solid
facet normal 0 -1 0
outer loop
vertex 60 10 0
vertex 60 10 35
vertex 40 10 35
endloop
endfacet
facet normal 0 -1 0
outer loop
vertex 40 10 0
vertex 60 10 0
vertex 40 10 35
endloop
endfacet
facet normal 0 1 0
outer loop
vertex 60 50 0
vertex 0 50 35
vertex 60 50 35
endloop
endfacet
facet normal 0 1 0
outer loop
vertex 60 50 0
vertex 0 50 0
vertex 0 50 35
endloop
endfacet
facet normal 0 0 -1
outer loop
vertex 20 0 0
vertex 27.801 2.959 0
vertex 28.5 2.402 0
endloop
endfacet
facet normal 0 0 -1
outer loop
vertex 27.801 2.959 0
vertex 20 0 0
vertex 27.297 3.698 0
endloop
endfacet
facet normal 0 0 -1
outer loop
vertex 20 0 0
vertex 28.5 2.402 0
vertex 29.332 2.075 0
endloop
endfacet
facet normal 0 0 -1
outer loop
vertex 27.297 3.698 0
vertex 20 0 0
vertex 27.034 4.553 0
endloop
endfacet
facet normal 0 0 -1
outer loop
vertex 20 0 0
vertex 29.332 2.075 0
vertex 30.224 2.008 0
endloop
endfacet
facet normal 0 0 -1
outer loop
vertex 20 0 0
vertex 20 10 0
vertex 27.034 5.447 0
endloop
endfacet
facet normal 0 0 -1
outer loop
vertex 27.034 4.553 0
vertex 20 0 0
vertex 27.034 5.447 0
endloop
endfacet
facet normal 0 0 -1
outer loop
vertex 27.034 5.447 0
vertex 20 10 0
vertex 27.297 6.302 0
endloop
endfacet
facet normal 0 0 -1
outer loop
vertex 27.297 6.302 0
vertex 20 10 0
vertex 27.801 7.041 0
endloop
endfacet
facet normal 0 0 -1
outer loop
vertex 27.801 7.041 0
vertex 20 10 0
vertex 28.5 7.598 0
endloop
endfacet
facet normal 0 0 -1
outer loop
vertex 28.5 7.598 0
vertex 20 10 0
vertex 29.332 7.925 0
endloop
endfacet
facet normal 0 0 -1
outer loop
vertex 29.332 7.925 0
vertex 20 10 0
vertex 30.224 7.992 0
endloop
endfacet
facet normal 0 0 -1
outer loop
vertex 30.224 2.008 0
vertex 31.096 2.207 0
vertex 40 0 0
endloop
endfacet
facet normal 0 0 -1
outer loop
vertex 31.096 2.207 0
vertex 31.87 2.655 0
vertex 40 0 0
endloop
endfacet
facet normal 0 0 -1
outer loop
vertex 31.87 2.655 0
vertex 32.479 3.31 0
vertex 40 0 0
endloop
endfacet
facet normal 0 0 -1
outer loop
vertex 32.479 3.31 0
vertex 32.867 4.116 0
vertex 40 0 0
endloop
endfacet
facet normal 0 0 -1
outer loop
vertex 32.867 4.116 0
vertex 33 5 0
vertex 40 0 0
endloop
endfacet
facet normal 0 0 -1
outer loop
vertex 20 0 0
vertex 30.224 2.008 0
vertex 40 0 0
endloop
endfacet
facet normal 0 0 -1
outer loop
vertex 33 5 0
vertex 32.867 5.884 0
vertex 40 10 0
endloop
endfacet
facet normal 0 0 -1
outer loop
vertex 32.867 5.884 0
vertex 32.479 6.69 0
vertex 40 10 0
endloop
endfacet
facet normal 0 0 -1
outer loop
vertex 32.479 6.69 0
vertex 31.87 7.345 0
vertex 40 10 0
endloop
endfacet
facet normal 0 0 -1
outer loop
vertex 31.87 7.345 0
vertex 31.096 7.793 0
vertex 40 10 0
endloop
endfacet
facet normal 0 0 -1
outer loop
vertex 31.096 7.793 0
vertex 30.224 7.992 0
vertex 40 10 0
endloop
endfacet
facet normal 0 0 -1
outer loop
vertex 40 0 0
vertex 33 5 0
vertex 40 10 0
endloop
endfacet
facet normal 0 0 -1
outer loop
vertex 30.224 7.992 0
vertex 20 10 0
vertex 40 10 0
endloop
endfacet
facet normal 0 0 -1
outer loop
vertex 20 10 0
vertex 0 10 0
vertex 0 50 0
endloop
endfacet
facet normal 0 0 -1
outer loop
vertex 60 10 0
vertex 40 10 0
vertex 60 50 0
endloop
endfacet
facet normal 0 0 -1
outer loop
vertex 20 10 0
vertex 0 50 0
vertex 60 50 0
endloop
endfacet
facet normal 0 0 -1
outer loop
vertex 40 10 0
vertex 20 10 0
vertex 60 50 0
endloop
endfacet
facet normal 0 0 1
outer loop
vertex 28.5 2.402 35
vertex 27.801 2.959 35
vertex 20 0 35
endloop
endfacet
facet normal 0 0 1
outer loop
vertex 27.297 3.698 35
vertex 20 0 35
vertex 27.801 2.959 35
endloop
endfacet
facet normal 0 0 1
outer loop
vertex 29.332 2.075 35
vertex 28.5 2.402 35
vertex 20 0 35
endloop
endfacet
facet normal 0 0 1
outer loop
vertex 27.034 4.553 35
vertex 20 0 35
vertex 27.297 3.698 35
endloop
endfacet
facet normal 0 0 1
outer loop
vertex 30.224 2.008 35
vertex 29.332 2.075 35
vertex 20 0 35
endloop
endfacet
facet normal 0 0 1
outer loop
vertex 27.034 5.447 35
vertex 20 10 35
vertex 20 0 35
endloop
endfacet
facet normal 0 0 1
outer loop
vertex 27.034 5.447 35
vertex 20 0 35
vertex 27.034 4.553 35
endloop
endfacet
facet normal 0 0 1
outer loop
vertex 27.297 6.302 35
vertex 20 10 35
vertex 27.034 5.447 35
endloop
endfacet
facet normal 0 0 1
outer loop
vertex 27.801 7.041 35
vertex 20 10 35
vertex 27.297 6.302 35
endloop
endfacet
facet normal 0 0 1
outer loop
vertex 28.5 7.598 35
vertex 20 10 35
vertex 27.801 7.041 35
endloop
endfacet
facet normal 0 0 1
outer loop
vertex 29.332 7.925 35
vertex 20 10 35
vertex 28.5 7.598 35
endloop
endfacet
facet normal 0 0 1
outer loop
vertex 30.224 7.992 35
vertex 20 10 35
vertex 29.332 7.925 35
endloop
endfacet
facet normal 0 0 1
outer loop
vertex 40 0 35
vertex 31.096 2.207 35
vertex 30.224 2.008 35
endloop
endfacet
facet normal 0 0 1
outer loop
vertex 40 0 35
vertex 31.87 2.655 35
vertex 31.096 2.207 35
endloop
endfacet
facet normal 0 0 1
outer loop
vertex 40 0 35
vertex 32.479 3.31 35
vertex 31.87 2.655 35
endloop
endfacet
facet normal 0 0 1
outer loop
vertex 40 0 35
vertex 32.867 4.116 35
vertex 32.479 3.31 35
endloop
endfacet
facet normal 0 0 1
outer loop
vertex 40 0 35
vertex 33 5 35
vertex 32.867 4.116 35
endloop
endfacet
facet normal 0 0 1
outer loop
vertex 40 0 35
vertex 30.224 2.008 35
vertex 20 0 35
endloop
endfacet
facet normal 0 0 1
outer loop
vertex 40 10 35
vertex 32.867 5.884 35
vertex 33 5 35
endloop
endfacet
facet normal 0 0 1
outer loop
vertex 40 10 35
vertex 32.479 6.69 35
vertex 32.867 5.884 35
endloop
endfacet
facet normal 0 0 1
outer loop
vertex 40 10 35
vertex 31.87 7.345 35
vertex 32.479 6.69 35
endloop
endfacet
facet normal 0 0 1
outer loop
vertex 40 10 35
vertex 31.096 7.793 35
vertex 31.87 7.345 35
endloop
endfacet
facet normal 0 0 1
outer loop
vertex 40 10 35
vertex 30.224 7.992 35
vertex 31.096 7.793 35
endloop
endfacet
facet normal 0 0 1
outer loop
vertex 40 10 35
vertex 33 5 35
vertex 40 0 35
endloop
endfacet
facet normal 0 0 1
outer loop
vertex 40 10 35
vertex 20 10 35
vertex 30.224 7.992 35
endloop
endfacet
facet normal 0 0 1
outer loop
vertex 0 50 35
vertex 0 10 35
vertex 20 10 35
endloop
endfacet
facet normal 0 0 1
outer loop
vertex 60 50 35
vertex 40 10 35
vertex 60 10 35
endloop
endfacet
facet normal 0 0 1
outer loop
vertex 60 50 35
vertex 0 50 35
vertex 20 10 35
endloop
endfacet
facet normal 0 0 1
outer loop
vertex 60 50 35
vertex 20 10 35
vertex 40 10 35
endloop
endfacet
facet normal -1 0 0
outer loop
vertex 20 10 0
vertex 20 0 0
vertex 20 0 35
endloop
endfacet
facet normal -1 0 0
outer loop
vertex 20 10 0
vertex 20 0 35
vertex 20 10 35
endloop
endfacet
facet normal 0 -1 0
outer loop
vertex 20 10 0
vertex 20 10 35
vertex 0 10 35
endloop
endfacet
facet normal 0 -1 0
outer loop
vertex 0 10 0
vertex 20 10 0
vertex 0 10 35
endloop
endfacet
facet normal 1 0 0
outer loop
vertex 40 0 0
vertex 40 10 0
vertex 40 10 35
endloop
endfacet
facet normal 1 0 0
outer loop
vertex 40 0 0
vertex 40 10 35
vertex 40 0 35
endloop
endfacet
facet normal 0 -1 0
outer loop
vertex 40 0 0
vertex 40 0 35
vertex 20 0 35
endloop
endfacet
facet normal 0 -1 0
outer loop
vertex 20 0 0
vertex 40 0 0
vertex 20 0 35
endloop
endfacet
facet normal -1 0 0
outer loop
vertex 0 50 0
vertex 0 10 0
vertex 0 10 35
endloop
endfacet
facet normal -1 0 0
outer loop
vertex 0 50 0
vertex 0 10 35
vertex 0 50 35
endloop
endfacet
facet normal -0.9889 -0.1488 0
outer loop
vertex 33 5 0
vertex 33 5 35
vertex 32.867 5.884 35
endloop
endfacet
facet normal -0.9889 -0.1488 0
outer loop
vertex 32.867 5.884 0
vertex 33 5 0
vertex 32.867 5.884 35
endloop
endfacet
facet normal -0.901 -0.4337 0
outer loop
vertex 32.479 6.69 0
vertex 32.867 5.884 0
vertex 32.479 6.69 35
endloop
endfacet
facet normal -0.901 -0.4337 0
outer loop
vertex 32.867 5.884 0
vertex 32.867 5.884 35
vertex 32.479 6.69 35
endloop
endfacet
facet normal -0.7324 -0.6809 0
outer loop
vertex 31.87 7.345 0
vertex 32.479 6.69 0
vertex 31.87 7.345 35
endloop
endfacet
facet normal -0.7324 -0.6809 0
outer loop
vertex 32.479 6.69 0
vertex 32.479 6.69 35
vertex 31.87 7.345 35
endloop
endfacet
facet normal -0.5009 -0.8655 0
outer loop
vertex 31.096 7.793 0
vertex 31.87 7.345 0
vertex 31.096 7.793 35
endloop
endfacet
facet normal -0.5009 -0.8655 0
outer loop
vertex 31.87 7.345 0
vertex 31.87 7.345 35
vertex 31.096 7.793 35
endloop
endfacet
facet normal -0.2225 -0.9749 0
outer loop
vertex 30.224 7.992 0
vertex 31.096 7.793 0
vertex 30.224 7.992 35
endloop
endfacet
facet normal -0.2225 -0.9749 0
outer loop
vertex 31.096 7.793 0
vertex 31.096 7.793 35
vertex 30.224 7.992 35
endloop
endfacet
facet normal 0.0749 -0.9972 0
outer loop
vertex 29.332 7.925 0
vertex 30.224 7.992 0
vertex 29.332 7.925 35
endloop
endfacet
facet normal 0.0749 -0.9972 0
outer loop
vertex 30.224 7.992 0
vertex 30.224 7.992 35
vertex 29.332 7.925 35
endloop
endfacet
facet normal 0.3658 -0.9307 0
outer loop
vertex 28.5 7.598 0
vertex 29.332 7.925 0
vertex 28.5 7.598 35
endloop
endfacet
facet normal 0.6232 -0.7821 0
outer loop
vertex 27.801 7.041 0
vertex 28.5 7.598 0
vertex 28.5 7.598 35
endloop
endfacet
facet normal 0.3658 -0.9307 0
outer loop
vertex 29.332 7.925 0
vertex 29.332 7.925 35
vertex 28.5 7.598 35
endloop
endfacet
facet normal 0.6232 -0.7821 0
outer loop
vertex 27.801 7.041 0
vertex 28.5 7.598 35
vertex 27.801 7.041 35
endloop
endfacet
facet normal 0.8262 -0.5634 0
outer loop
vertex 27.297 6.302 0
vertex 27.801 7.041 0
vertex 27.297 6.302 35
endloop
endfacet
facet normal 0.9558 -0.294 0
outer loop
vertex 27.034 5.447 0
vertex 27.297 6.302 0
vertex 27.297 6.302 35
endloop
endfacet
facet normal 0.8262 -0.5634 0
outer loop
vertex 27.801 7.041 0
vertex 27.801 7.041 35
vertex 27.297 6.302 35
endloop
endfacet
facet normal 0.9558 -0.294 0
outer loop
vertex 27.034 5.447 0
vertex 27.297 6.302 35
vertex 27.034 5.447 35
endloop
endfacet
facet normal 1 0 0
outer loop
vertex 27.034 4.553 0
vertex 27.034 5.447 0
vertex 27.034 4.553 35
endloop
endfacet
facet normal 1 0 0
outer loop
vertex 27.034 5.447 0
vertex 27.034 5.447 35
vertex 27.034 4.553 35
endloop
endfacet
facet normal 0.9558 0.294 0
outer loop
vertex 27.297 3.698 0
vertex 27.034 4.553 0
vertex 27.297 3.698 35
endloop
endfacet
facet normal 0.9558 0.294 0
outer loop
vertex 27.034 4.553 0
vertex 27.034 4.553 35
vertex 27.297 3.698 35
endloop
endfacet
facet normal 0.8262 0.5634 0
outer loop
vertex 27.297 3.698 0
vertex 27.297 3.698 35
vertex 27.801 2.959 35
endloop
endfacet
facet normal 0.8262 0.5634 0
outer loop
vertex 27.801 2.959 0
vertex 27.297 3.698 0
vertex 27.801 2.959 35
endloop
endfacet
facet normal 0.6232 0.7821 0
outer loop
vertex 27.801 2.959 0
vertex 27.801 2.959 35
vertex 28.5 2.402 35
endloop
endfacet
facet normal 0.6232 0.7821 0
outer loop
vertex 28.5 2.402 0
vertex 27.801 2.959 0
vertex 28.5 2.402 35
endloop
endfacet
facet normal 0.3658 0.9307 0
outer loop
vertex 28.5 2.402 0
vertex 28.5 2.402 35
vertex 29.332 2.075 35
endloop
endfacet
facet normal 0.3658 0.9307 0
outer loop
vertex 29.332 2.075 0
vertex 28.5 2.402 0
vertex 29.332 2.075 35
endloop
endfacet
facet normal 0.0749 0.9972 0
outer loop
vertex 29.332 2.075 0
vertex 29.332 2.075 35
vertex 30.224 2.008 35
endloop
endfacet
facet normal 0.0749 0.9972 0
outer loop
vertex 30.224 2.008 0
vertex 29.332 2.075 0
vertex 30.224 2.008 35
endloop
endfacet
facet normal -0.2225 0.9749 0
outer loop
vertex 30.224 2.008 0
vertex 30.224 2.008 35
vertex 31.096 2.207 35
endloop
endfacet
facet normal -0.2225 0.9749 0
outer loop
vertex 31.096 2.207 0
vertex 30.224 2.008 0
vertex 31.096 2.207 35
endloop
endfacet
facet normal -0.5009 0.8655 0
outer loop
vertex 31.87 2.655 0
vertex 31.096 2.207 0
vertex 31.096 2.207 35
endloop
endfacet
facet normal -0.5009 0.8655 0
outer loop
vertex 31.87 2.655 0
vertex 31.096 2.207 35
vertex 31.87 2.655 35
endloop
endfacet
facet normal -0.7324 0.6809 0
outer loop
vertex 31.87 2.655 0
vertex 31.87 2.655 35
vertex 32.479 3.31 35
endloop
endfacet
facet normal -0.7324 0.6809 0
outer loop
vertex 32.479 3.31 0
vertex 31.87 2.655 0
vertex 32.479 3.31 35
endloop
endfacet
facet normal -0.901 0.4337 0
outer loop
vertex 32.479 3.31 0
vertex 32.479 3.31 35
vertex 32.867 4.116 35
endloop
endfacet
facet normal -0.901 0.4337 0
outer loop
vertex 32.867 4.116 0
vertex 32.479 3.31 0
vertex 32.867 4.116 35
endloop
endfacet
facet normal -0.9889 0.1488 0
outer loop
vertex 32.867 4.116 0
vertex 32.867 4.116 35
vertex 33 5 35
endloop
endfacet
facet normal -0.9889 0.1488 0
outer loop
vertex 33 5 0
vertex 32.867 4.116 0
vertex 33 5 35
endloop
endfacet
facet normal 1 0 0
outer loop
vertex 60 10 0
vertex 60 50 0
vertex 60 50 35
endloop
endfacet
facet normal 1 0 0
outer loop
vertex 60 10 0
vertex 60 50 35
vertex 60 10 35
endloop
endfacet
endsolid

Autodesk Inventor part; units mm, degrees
ref_plane "YZ Plane" through (0, 0, 0) normal (1, 0, 0) x (0, 1, 0)
ref_plane "XZ Plane" through (0, 0, 0) normal (0, 1, 0) x (-1, 0, 0)
ref_plane "XY Plane" through (0, 0, 0) normal (0, 0, 1) x (1, 0, 0)
sketch "Sketch1" plane through (0, 0, 0) normal (0, 0, 1) x (1, 0, 0)
  line L0 (0, 10) -> (0, 50)
  line L1 (0, 50) -> (60, 50)
  line L2 (60, 50) -> (60, 10)
  line L3 (60, 10) -> (40, 10)
  line L4 (40, 10) -> (40, 0)
  line L5 (40, 0) -> (20, 0)
  line L6 (20, 0) -> (20, 10)
  line L7 (20, 10) -> (0, 10)
  point P0 (0, 0)
  dimension "d0" = 40
  dimension "d1" = 60
  dimension "d2" = 20
  dimension "d3" = 20
extrude "Extrusion1" add sketch "Sketch1" along normal blind 35
sketch "Sketch2" plane through (0, 0, 35) normal (0, 0, 1) x (1, 0, 0)
  circle A0 centre (30, 5) radius 3
  line L0 (20, 10) -> (20, 0) projected
  line L1 (20, 0) -> (40, 0) projected
  point P0 (0, 0)
  point P1 (20, 5)
  point P2 (30, 0)
  dimension "d6" = 6
  dimension "d7" = 10
  dimension "d8" = 5
extrude "Extrusion2" cut sketch "Sketch2" against normal blind 35
properties part number "haraketli_cene"
